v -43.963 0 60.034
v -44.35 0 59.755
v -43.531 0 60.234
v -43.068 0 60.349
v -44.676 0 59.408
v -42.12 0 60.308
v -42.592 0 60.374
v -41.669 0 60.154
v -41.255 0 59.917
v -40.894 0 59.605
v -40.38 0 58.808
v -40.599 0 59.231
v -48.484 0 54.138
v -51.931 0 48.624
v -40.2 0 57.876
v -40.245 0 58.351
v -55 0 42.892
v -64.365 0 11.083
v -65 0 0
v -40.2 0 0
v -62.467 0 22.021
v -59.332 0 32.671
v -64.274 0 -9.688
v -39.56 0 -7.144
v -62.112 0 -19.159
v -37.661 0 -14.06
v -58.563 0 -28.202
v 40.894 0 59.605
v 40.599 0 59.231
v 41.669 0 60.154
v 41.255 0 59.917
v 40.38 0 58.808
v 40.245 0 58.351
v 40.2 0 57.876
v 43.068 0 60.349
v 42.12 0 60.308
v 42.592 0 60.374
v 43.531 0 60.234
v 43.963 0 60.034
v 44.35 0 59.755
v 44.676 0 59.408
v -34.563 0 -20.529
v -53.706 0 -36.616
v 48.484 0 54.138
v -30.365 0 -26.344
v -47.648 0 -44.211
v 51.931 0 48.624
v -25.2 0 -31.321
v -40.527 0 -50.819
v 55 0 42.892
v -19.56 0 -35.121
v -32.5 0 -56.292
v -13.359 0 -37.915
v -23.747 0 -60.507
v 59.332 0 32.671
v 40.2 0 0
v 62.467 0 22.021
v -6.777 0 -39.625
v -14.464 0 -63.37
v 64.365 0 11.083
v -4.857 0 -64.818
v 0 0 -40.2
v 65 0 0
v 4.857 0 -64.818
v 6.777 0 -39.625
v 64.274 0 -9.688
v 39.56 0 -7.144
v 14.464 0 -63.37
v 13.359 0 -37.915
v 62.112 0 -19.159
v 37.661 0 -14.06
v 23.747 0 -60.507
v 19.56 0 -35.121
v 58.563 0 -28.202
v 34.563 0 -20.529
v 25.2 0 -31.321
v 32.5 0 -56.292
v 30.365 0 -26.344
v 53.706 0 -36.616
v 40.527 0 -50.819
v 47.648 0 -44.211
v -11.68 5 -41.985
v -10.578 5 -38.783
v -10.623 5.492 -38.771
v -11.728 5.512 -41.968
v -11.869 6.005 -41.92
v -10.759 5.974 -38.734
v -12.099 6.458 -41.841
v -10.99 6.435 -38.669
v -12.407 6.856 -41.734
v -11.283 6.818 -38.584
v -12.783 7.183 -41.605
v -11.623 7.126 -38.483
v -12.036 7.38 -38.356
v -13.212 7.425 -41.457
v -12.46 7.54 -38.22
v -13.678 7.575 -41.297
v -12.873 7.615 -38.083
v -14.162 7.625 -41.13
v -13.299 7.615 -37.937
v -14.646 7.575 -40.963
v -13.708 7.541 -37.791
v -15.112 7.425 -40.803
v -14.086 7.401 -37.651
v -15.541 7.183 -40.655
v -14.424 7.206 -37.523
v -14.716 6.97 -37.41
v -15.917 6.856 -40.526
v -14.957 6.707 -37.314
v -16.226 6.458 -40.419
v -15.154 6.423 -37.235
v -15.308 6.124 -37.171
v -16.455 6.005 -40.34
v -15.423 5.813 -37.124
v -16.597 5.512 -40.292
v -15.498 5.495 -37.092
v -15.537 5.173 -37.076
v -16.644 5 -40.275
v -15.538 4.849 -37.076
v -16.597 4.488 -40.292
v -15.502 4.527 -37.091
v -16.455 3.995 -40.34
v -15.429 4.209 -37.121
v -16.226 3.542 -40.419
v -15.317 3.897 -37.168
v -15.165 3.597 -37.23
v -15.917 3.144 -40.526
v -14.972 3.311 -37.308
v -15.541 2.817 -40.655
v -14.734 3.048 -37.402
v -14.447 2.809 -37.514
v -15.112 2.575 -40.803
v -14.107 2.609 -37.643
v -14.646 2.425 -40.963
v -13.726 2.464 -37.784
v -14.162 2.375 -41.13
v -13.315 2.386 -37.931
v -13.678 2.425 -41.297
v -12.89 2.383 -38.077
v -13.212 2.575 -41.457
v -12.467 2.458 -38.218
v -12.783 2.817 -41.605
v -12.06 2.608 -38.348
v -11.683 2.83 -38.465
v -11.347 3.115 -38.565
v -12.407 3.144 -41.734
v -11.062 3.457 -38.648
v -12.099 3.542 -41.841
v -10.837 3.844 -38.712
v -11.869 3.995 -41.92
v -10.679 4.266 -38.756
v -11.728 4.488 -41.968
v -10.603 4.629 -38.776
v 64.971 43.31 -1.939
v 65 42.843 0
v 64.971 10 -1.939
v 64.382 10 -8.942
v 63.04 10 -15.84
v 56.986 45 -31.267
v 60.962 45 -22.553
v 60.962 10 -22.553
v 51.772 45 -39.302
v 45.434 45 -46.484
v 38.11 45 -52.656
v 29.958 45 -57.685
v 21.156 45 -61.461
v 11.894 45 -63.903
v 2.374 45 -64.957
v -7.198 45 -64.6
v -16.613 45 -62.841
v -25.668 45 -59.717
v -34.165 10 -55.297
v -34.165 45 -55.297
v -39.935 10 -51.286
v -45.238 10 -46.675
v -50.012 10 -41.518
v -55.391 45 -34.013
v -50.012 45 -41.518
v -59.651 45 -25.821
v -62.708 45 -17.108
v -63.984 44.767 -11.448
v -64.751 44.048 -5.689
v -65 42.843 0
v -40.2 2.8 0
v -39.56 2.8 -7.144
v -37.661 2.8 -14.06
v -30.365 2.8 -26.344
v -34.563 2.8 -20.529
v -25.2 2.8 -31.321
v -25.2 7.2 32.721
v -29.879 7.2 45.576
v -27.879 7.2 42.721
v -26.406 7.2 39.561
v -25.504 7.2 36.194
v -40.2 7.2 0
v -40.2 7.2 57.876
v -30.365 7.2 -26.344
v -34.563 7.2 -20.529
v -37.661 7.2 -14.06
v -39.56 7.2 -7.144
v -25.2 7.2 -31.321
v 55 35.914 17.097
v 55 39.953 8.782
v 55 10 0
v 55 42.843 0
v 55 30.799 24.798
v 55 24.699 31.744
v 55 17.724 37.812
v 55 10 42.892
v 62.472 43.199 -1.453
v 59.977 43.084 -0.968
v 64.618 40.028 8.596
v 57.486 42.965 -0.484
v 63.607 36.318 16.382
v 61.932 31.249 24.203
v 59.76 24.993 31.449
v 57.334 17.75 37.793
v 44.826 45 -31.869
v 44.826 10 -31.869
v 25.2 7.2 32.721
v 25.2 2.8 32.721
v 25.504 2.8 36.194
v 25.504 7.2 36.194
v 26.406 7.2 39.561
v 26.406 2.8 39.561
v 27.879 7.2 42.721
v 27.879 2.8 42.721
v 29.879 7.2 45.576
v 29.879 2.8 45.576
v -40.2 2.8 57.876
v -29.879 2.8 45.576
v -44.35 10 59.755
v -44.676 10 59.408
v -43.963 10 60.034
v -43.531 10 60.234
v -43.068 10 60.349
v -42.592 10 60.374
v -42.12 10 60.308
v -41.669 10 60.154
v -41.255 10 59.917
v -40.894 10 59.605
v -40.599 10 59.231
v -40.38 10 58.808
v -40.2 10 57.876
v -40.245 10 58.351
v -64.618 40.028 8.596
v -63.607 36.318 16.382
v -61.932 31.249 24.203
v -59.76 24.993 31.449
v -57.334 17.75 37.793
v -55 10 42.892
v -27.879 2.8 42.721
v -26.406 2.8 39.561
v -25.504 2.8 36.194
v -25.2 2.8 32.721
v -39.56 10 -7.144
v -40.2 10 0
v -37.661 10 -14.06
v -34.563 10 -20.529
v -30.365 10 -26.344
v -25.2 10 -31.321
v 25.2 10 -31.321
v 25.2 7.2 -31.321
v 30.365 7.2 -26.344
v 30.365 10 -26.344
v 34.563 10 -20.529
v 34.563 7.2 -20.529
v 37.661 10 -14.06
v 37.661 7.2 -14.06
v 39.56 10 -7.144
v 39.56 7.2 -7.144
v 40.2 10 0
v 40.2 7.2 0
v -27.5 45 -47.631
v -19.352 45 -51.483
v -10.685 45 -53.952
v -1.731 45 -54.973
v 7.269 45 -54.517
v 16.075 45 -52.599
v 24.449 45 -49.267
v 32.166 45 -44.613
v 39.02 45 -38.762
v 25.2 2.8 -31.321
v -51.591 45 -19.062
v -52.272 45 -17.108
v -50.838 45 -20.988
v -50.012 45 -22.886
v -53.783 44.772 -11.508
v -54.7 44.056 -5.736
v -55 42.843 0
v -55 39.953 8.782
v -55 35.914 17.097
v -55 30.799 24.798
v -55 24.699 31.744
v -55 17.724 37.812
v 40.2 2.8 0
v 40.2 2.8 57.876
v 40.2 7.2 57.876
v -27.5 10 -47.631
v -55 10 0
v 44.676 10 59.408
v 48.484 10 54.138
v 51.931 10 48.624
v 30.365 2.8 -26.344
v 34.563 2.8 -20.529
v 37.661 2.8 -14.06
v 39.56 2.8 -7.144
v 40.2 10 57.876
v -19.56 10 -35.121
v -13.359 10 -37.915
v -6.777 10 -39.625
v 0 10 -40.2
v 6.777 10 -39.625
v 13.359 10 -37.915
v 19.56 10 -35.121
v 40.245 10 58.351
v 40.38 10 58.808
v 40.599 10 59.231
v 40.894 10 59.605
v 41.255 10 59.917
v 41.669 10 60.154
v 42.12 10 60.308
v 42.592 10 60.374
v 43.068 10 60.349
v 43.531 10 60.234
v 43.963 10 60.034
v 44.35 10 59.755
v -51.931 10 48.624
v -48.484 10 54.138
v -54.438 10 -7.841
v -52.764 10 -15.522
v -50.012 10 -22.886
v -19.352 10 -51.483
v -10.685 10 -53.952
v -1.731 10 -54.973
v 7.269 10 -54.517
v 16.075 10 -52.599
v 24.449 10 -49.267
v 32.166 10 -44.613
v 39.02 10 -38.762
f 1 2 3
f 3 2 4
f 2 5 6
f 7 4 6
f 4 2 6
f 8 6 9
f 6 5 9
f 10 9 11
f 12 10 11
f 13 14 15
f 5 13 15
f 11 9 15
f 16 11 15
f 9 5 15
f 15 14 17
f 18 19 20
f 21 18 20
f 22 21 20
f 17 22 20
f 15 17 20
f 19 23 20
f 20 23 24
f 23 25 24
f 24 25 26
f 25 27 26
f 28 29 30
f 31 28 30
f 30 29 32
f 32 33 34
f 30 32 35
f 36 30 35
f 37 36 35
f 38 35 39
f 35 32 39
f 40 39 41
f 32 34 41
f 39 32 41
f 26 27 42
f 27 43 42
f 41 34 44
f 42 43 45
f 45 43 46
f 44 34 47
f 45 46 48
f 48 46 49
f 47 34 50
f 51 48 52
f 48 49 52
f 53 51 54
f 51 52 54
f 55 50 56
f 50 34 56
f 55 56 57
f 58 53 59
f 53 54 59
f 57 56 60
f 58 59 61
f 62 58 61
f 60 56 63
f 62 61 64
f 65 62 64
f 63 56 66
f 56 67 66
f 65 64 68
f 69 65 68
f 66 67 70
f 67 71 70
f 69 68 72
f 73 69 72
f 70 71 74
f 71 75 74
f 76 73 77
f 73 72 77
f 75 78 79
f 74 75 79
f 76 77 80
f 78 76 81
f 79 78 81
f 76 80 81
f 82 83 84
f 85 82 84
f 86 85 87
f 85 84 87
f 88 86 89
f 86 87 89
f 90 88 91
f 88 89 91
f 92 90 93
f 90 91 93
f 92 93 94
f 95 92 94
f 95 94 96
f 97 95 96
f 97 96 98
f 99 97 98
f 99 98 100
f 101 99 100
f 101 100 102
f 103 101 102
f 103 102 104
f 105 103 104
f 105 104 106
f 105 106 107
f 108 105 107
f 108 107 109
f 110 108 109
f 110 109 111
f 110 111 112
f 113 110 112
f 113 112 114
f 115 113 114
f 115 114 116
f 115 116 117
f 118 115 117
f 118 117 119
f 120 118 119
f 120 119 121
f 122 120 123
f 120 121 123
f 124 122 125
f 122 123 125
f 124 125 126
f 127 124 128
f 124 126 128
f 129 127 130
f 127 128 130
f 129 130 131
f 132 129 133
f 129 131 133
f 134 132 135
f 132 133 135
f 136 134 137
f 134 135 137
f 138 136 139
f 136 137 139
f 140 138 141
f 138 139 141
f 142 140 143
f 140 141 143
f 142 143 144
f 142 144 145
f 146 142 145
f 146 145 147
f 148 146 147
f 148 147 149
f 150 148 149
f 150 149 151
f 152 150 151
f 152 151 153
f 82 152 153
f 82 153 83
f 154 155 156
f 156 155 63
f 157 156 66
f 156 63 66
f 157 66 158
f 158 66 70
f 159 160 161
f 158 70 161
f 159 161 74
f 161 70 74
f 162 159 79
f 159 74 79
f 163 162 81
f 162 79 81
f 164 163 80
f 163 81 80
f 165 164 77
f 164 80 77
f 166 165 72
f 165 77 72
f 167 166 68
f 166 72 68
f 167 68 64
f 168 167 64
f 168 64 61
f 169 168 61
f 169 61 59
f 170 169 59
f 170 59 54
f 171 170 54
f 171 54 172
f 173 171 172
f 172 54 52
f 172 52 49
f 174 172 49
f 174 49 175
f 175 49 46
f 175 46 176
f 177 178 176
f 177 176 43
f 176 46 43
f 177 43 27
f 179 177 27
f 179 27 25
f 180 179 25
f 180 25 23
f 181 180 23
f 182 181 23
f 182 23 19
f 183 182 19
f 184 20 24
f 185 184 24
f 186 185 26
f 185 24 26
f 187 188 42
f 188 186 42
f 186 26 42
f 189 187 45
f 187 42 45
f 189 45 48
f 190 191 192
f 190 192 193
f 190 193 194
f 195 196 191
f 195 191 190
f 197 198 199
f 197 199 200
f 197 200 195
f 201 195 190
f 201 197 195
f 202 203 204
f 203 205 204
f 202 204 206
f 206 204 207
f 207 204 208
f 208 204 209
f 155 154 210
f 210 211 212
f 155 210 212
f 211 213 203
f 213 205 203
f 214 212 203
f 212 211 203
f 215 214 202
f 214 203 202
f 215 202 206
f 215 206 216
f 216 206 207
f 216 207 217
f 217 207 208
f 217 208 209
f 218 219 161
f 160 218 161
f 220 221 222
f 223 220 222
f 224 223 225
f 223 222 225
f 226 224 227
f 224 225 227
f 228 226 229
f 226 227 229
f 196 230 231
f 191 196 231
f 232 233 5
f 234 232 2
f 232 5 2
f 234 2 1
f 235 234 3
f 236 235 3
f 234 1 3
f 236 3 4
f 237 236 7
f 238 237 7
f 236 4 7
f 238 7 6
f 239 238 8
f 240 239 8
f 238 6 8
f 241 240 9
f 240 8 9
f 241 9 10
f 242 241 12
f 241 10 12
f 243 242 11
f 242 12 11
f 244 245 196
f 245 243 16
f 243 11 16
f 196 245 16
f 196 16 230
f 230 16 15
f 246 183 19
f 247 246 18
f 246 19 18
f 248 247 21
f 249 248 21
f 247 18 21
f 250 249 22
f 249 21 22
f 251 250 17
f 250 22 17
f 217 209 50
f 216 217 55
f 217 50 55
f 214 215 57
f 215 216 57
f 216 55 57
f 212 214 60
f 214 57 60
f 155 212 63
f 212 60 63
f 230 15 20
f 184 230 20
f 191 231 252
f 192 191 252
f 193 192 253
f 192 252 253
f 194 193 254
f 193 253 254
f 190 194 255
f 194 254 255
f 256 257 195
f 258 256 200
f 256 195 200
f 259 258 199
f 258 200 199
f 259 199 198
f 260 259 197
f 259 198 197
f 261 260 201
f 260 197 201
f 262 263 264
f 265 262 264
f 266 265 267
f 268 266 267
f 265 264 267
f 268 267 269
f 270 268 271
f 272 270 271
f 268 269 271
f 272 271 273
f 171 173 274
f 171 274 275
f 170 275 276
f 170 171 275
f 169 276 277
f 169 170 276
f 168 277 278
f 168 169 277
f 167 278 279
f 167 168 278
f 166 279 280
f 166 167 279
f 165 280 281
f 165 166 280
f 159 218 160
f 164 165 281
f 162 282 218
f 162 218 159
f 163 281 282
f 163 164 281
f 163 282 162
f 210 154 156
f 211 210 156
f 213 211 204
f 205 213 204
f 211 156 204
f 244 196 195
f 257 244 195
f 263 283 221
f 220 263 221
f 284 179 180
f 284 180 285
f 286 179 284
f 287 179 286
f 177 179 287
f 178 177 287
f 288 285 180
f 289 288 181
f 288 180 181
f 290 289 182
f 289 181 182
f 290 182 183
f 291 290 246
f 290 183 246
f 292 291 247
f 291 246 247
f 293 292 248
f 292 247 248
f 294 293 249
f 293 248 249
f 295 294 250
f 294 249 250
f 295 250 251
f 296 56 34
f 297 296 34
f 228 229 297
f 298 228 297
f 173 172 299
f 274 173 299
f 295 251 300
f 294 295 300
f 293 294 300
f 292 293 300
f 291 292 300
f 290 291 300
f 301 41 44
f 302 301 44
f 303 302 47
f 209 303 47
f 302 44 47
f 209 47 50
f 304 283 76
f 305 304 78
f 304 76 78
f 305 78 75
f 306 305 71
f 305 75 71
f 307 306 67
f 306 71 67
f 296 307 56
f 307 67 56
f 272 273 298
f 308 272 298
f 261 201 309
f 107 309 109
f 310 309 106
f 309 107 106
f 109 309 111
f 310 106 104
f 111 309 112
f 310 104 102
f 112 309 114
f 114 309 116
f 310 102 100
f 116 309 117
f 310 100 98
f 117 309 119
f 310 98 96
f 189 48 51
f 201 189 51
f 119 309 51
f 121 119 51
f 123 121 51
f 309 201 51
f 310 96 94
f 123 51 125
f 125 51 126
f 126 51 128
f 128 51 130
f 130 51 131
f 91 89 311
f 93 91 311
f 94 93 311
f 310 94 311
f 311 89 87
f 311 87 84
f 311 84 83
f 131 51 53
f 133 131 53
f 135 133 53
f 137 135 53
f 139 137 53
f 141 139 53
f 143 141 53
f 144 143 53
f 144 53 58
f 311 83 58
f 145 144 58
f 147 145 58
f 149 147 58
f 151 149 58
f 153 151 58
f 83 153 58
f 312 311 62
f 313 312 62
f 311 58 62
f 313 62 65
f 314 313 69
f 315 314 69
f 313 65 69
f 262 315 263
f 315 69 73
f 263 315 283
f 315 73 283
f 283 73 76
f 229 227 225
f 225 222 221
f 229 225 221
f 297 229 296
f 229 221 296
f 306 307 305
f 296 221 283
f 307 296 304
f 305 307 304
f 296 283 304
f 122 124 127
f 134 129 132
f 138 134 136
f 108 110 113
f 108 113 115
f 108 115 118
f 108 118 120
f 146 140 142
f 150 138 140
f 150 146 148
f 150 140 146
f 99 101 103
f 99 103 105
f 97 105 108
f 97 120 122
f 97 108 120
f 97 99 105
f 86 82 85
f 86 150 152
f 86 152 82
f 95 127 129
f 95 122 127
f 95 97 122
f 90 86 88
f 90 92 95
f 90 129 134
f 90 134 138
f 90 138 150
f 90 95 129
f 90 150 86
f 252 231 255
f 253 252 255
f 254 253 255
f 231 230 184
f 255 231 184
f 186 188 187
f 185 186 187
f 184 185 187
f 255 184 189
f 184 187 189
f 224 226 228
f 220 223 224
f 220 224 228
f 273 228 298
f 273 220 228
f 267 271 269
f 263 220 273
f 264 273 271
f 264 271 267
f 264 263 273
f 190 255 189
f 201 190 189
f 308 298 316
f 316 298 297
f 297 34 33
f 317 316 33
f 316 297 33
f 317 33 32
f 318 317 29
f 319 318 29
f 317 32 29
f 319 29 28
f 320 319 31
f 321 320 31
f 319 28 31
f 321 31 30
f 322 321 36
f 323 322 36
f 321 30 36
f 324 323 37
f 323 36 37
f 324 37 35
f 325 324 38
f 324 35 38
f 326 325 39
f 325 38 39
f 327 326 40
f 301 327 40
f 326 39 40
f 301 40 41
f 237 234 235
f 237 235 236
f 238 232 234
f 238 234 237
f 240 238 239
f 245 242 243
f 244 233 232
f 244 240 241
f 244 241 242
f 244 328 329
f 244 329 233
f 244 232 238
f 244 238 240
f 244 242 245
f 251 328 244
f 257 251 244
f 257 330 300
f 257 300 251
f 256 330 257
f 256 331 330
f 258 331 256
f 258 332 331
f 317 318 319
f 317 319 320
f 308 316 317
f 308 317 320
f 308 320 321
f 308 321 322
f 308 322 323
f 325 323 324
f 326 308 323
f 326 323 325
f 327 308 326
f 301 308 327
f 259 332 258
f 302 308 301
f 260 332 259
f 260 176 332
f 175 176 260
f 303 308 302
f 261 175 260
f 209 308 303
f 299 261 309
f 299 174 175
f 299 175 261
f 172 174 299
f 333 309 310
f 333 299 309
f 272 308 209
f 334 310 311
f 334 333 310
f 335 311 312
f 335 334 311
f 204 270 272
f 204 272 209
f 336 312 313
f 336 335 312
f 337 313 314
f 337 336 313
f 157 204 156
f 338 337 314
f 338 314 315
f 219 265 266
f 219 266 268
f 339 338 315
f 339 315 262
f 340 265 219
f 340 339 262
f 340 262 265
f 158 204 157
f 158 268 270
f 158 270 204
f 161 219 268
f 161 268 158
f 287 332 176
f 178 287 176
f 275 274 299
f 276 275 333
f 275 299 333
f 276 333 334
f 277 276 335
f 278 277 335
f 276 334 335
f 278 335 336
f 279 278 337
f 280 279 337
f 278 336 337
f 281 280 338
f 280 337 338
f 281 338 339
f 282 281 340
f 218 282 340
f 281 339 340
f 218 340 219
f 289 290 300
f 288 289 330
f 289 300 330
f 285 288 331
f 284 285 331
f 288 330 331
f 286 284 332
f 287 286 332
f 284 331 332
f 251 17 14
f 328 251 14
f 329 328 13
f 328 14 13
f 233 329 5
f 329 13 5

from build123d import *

# Parameters (mm, degrees)
BOSS_EXTRUDE1_DEPTH     = 10
BOSS_EXTRUDE2_START     = 2.8
BOSS_EXTRUDE2_DEPTH     = 4.4
BOSS_EXTRUDE3_DEPTH     = 45
CUT_EXTRUDE1_DEPTH      = 103.347447452
CUT_EXTRUDE1_DEPTH_BACK = 103.347447452
CUT_EXTRUDE2_START      = -35
CUT_EXTRUDE2_DEPTH      = 35
SKETCH7_R               = 2.625
CUT_EXTRUDE5_DEPTH      = 43.5


with BuildPart() as part:
    # Sketch1 → Boss-Extrude1 (new body)
    with BuildSketch(Plane(origin=(0, 0, 0), x_dir=(1, 0, 0), z_dir=(0, 1, 0))):
        with BuildLine():
            Line((-40.2, -57.876303889), (-40.2, 0))
            ThreePointArc((-40.2, 0), (-36.256585609, 17.363755354), (-25.2, 31.320919527))
            ThreePointArc((-25.2, 31.320919527), (0, 40.2), (25.2, 31.320919527))
            ThreePointArc((25.2, 31.320919527), (36.256585609, 17.363755354), (40.2, 0))
            Line((40.2, 0), (40.2, -57.876303889))
            ThreePointArc((40.2, -57.876303889), (41.890773052, -60.2417112), (44.676121397, -59.40762496))
            ThreePointArc((44.676121397, -59.40762496), (50.25367708, -51.409776352), (55, -42.892316139))
            Line((55, -42.892316139), (55, 0))
            ThreePointArc((55, 0), (0, 55), (-55, 0))
            Line((-55, 0), (-55, -42.892316139))
            ThreePointArc((-55, -42.892316139), (-50.25367708, -51.409776352), (-44.676121397, -59.40762496))
            ThreePointArc((-44.676121397, -59.40762496), (-41.890773052, -60.2417112), (-40.2, -57.876303889))
        make_face()
    extrude(amount=BOSS_EXTRUDE1_DEPTH)

    # Sketch1<5> → Boss-Extrude2 (add)
    with BuildSketch(Plane(origin=(0, 0, 0), x_dir=(1, 0, 0), z_dir=(0, 1, 0)).offset(BOSS_EXTRUDE2_START)):
        with BuildLine():
            ThreePointArc((-25.2, 31.320919527), (-36.256585609, 17.363755354), (-40.2, 0))
            Line((-40.2, 0), (-40.2, -57.876303889))
            Line((-40.2, -57.876303889), (-29.879111138, -45.576347508))
            ThreePointArc((-29.879111138, -45.576347508), (-26.406147584, -39.560998181), (-25.2, -32.720595315))
            Line((-25.2, -32.720595315), (-25.2, 31.320919527))
        make_face()
        with BuildLine():
            ThreePointArc((40.2, 0), (36.256585609, 17.363755354), (25.2, 31.320919527))
            Line((25.2, 31.320919527), (25.2, -32.720595315))
            ThreePointArc((25.2, -32.720595315), (26.406147584, -39.560998181), (29.879111138, -45.576347508))
            Line((29.879111138, -45.576347508), (40.2, -57.876303889))
            Line((40.2, -57.876303889), (40.2, 0))
        make_face()
    extrude(amount=BOSS_EXTRUDE2_DEPTH)

    # Sketch1<6> → Boss-Extrude3 (add)
    with BuildSketch(Plane(origin=(0, 0, 0), x_dir=(1, 0, 0), z_dir=(0, 1, 0))):
        with BuildLine():
            ThreePointArc((-65, 0), (-62.466921066, -22.021300959), (-55, -42.892316139))
            Line((-55, -42.892316139), (-55, 0))
            ThreePointArc((-55, 0), (0, 55), (55, 0))
            Line((55, 0), (55, -42.892316139))
            ThreePointArc((55, -42.892316139), (62.466921066, -22.021300959), (65, 0))
            ThreePointArc((65, 0), (0, 65), (-65, 0))
        make_face()
    extrude(amount=BOSS_EXTRUDE3_DEPTH)

    # Sketch2 → Cut-Extrude1 (cut, two sides: drawn at the far end of the back side and taken through both)
    with BuildSketch(Plane(origin=(0, 0, 0), x_dir=(0, 0, -1), z_dir=(1, 0, 0)).offset(-CUT_EXTRUDE1_DEPTH_BACK)):
        with BuildLine():
            Line((-42.892316139, 10), (-42.892316139, 45))
            Line((-42.892316139, 45), (17.107683861, 45))
            ThreePointArc((17.107683861, 45), (-17.623426113, 35.61047424), (-42.892316139, 10))
        make_face()
    extrude(amount=CUT_EXTRUDE1_DEPTH + CUT_EXTRUDE1_DEPTH_BACK, mode=Mode.SUBTRACT)

    # Sketch3 → Cut-Extrude2 (cut)
    with BuildSketch(Plane(origin=(0, 45, 0), x_dir=(1, 0, 0), z_dir=(0, 1, 0)).offset(CUT_EXTRUDE2_START)):
        with BuildLine():
            Line((-34.164958741, 55.296976357), (-27.5, 47.631397208))
            ThreePointArc((-27.5, 47.631397208), (-36.087479082, 41.505347288), (-43.347496237, 33.852541558))
            ThreePointArc((-43.347496237, 33.852541558), (-47.000937608, 28.564170983), (-50.012454978, 22.885679957))
            Line((-50.012454978, 22.885679957), (-50.012454978, 41.518120707))
            ThreePointArc((-50.012454978, 41.518120707), (-42.648838916, 49.051774067), (-34.164958741, 55.296976357))
        make_face()
        with BuildLine():
            Line((64.971065648, 1.93923401), (55, 0))
            ThreePointArc((55, 0), (53.988424685, 10.5), (50.990909091, 20.613762153))
            ThreePointArc((50.990909091, 20.613762153), (48.237766513, 26.421920479), (44.825807714, 31.869216538))
            Line((44.825807714, 31.869216538), (60.961974739, 22.552996163))
            ThreePointArc((60.961974739, 22.552996163), (63.804501901, 12.409090909), (64.971065648, 1.93923401))
        make_face()
    extrude(amount=CUT_EXTRUDE2_DEPTH, mode=Mode.SUBTRACT)

    # Sketch7 → Cut-Extrude5 (cut)
    with BuildSketch(Plane(origin=(0, 0, 0), x_dir=(0, 1, 0), z_dir=(0.32556815445715737, 0, 0.9455185755993166))):
        with Locations(Location((5, 0, 0), (0, 0, 270))):
            Circle(SKETCH7_R)
    extrude(amount=-CUT_EXTRUDE5_DEPTH, mode=Mode.SUBTRACT)


solid = part.part
